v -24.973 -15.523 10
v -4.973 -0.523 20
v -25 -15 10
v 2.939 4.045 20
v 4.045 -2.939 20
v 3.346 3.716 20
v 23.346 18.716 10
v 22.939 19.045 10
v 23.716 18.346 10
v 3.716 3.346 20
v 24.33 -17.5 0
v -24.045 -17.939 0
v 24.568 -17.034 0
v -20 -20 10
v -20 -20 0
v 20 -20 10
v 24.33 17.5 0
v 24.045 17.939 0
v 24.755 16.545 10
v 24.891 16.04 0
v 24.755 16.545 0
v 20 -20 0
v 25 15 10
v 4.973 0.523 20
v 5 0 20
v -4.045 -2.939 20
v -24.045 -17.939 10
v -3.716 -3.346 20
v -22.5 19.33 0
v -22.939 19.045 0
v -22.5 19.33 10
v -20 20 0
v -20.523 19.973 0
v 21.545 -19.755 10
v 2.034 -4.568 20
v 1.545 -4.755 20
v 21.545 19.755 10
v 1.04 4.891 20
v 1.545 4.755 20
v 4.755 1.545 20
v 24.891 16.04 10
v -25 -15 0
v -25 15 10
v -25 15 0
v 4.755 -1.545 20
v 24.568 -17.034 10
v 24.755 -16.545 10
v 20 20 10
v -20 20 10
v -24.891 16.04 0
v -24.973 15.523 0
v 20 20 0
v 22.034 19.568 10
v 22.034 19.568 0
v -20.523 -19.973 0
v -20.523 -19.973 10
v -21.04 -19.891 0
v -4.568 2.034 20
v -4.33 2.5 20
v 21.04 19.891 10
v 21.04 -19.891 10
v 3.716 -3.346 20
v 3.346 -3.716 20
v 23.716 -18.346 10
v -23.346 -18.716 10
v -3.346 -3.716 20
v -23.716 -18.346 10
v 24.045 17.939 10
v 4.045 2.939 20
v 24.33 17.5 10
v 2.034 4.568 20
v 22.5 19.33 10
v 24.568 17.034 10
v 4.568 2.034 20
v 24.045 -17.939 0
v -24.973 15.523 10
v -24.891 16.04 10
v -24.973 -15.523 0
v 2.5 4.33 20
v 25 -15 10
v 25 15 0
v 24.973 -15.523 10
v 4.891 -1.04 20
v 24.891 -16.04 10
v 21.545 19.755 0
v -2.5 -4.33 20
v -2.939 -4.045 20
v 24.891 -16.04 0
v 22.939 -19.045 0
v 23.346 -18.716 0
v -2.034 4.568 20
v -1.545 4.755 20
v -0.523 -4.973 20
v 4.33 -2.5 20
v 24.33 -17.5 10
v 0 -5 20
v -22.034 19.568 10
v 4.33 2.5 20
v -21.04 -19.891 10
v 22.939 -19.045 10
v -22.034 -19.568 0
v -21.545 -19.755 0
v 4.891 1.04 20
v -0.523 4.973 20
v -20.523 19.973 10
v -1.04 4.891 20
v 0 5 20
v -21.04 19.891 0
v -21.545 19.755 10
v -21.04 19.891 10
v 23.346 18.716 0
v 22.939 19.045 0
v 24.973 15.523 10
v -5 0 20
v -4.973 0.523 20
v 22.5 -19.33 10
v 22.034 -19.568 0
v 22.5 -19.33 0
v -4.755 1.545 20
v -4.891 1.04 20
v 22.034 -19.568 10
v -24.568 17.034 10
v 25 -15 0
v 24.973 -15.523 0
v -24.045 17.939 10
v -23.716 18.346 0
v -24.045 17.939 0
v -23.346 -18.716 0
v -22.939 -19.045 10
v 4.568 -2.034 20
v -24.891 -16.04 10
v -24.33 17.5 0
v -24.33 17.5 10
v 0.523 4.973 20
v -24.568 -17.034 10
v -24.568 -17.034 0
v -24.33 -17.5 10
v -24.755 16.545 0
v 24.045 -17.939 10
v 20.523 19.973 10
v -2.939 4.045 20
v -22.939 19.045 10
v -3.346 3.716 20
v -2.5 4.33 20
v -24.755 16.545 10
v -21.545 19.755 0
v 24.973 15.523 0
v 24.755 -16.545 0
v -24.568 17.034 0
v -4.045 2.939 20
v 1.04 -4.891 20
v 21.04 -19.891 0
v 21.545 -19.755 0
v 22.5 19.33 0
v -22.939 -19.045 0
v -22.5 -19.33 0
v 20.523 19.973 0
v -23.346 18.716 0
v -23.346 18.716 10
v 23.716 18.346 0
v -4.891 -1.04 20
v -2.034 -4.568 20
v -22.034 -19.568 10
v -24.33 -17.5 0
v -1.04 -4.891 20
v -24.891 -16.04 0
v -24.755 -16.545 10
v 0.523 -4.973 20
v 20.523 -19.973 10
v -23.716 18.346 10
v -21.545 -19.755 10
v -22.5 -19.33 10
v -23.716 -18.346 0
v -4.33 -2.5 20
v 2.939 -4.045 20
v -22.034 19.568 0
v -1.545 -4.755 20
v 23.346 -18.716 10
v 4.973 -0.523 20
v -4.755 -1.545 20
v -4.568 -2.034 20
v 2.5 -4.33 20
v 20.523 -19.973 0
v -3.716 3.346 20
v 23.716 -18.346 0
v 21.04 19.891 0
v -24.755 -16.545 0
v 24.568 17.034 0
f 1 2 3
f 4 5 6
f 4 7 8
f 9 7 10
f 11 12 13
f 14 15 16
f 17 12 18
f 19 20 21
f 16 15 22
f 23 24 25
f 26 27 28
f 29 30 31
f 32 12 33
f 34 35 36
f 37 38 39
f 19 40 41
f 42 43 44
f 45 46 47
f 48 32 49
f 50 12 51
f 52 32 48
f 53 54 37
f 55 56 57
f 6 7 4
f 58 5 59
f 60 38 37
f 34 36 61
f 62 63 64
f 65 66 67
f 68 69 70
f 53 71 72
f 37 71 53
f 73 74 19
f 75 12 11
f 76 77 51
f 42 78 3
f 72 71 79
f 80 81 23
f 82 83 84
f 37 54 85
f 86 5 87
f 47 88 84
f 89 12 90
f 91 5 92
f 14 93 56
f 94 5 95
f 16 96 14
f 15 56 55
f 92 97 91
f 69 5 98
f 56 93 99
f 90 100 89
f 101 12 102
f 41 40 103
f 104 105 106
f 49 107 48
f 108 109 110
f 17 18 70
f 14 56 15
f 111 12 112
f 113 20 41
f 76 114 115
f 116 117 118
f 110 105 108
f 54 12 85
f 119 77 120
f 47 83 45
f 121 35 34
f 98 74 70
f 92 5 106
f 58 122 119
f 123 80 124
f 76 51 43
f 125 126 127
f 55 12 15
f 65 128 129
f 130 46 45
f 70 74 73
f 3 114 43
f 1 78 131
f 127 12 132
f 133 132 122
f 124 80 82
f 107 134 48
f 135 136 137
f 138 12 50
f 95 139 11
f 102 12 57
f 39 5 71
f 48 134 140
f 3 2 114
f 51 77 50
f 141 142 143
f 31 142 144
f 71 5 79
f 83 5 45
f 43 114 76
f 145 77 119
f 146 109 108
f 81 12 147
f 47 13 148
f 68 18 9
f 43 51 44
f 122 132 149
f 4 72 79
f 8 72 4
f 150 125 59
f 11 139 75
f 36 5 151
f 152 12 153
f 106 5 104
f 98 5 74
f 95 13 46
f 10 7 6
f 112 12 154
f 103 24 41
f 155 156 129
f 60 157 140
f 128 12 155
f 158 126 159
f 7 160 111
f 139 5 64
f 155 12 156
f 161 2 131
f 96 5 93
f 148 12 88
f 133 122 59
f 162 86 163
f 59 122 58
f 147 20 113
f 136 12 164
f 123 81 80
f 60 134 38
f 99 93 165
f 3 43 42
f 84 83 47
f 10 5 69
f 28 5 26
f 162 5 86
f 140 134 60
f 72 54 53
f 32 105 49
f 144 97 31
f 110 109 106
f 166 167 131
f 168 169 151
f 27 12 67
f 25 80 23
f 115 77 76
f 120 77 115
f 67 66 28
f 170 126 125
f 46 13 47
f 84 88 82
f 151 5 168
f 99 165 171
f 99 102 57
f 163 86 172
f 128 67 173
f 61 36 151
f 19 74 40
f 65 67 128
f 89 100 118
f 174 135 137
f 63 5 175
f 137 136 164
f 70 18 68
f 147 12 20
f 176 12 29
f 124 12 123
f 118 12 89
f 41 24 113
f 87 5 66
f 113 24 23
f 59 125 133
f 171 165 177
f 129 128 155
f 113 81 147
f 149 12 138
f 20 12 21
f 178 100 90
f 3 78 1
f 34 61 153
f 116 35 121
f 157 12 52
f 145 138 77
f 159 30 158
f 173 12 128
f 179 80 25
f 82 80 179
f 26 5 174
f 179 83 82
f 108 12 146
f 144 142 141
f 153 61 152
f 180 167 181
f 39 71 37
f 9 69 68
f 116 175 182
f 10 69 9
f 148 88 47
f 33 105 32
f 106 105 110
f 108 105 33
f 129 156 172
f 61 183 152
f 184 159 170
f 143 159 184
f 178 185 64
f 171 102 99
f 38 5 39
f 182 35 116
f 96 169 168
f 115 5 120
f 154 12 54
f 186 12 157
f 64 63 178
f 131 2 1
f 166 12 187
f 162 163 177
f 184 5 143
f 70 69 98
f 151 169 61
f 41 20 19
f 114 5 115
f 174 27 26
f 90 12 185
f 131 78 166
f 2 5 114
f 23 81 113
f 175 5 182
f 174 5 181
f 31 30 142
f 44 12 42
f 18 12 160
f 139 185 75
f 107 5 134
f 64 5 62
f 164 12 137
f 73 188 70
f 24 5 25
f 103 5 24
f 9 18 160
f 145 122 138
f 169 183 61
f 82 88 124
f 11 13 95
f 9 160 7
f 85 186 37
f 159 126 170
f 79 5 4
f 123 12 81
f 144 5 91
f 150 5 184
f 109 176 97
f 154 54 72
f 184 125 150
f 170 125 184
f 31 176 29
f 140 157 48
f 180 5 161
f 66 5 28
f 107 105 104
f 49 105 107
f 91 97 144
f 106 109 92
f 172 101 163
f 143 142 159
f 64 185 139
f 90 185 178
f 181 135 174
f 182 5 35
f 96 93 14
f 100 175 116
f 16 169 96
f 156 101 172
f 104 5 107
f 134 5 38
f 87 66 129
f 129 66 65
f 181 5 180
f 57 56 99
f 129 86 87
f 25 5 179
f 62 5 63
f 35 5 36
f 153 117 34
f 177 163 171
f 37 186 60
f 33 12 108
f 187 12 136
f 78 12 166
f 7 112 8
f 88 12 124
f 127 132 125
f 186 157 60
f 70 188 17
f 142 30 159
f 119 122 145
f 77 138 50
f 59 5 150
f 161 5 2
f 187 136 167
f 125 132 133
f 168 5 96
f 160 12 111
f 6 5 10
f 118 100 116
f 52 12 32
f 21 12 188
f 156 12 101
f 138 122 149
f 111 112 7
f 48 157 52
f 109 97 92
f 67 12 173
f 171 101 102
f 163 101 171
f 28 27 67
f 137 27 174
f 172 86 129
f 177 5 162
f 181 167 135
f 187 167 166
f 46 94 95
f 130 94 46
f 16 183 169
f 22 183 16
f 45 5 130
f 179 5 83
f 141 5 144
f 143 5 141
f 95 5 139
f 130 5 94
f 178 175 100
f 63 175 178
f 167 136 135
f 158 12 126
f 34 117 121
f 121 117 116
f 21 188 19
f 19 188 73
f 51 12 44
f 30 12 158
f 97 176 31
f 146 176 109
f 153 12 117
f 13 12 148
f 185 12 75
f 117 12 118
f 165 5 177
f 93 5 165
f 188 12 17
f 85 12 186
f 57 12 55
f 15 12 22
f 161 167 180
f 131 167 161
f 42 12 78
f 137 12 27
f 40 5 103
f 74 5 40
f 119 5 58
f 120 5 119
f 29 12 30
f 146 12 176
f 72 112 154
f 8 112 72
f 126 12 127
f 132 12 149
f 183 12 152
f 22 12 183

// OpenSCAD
radio = 5;
altura = 10;
longitudx = 50;
longitudy = 40;

x = longitudx/2-radio;
y = longitudy/2-radio;

POINT = [
	[x,y,0],
	[-x,y,0],
	[-x,-y,0],
	[x,-y,0],
	[0,0,altura]
];

color("purple")
translate([0,0,5])
hull(){
	for(pos=POINT)
		translate(pos)
			cylinder(r=radio,h=altura,center=true,$fn=60);
}
